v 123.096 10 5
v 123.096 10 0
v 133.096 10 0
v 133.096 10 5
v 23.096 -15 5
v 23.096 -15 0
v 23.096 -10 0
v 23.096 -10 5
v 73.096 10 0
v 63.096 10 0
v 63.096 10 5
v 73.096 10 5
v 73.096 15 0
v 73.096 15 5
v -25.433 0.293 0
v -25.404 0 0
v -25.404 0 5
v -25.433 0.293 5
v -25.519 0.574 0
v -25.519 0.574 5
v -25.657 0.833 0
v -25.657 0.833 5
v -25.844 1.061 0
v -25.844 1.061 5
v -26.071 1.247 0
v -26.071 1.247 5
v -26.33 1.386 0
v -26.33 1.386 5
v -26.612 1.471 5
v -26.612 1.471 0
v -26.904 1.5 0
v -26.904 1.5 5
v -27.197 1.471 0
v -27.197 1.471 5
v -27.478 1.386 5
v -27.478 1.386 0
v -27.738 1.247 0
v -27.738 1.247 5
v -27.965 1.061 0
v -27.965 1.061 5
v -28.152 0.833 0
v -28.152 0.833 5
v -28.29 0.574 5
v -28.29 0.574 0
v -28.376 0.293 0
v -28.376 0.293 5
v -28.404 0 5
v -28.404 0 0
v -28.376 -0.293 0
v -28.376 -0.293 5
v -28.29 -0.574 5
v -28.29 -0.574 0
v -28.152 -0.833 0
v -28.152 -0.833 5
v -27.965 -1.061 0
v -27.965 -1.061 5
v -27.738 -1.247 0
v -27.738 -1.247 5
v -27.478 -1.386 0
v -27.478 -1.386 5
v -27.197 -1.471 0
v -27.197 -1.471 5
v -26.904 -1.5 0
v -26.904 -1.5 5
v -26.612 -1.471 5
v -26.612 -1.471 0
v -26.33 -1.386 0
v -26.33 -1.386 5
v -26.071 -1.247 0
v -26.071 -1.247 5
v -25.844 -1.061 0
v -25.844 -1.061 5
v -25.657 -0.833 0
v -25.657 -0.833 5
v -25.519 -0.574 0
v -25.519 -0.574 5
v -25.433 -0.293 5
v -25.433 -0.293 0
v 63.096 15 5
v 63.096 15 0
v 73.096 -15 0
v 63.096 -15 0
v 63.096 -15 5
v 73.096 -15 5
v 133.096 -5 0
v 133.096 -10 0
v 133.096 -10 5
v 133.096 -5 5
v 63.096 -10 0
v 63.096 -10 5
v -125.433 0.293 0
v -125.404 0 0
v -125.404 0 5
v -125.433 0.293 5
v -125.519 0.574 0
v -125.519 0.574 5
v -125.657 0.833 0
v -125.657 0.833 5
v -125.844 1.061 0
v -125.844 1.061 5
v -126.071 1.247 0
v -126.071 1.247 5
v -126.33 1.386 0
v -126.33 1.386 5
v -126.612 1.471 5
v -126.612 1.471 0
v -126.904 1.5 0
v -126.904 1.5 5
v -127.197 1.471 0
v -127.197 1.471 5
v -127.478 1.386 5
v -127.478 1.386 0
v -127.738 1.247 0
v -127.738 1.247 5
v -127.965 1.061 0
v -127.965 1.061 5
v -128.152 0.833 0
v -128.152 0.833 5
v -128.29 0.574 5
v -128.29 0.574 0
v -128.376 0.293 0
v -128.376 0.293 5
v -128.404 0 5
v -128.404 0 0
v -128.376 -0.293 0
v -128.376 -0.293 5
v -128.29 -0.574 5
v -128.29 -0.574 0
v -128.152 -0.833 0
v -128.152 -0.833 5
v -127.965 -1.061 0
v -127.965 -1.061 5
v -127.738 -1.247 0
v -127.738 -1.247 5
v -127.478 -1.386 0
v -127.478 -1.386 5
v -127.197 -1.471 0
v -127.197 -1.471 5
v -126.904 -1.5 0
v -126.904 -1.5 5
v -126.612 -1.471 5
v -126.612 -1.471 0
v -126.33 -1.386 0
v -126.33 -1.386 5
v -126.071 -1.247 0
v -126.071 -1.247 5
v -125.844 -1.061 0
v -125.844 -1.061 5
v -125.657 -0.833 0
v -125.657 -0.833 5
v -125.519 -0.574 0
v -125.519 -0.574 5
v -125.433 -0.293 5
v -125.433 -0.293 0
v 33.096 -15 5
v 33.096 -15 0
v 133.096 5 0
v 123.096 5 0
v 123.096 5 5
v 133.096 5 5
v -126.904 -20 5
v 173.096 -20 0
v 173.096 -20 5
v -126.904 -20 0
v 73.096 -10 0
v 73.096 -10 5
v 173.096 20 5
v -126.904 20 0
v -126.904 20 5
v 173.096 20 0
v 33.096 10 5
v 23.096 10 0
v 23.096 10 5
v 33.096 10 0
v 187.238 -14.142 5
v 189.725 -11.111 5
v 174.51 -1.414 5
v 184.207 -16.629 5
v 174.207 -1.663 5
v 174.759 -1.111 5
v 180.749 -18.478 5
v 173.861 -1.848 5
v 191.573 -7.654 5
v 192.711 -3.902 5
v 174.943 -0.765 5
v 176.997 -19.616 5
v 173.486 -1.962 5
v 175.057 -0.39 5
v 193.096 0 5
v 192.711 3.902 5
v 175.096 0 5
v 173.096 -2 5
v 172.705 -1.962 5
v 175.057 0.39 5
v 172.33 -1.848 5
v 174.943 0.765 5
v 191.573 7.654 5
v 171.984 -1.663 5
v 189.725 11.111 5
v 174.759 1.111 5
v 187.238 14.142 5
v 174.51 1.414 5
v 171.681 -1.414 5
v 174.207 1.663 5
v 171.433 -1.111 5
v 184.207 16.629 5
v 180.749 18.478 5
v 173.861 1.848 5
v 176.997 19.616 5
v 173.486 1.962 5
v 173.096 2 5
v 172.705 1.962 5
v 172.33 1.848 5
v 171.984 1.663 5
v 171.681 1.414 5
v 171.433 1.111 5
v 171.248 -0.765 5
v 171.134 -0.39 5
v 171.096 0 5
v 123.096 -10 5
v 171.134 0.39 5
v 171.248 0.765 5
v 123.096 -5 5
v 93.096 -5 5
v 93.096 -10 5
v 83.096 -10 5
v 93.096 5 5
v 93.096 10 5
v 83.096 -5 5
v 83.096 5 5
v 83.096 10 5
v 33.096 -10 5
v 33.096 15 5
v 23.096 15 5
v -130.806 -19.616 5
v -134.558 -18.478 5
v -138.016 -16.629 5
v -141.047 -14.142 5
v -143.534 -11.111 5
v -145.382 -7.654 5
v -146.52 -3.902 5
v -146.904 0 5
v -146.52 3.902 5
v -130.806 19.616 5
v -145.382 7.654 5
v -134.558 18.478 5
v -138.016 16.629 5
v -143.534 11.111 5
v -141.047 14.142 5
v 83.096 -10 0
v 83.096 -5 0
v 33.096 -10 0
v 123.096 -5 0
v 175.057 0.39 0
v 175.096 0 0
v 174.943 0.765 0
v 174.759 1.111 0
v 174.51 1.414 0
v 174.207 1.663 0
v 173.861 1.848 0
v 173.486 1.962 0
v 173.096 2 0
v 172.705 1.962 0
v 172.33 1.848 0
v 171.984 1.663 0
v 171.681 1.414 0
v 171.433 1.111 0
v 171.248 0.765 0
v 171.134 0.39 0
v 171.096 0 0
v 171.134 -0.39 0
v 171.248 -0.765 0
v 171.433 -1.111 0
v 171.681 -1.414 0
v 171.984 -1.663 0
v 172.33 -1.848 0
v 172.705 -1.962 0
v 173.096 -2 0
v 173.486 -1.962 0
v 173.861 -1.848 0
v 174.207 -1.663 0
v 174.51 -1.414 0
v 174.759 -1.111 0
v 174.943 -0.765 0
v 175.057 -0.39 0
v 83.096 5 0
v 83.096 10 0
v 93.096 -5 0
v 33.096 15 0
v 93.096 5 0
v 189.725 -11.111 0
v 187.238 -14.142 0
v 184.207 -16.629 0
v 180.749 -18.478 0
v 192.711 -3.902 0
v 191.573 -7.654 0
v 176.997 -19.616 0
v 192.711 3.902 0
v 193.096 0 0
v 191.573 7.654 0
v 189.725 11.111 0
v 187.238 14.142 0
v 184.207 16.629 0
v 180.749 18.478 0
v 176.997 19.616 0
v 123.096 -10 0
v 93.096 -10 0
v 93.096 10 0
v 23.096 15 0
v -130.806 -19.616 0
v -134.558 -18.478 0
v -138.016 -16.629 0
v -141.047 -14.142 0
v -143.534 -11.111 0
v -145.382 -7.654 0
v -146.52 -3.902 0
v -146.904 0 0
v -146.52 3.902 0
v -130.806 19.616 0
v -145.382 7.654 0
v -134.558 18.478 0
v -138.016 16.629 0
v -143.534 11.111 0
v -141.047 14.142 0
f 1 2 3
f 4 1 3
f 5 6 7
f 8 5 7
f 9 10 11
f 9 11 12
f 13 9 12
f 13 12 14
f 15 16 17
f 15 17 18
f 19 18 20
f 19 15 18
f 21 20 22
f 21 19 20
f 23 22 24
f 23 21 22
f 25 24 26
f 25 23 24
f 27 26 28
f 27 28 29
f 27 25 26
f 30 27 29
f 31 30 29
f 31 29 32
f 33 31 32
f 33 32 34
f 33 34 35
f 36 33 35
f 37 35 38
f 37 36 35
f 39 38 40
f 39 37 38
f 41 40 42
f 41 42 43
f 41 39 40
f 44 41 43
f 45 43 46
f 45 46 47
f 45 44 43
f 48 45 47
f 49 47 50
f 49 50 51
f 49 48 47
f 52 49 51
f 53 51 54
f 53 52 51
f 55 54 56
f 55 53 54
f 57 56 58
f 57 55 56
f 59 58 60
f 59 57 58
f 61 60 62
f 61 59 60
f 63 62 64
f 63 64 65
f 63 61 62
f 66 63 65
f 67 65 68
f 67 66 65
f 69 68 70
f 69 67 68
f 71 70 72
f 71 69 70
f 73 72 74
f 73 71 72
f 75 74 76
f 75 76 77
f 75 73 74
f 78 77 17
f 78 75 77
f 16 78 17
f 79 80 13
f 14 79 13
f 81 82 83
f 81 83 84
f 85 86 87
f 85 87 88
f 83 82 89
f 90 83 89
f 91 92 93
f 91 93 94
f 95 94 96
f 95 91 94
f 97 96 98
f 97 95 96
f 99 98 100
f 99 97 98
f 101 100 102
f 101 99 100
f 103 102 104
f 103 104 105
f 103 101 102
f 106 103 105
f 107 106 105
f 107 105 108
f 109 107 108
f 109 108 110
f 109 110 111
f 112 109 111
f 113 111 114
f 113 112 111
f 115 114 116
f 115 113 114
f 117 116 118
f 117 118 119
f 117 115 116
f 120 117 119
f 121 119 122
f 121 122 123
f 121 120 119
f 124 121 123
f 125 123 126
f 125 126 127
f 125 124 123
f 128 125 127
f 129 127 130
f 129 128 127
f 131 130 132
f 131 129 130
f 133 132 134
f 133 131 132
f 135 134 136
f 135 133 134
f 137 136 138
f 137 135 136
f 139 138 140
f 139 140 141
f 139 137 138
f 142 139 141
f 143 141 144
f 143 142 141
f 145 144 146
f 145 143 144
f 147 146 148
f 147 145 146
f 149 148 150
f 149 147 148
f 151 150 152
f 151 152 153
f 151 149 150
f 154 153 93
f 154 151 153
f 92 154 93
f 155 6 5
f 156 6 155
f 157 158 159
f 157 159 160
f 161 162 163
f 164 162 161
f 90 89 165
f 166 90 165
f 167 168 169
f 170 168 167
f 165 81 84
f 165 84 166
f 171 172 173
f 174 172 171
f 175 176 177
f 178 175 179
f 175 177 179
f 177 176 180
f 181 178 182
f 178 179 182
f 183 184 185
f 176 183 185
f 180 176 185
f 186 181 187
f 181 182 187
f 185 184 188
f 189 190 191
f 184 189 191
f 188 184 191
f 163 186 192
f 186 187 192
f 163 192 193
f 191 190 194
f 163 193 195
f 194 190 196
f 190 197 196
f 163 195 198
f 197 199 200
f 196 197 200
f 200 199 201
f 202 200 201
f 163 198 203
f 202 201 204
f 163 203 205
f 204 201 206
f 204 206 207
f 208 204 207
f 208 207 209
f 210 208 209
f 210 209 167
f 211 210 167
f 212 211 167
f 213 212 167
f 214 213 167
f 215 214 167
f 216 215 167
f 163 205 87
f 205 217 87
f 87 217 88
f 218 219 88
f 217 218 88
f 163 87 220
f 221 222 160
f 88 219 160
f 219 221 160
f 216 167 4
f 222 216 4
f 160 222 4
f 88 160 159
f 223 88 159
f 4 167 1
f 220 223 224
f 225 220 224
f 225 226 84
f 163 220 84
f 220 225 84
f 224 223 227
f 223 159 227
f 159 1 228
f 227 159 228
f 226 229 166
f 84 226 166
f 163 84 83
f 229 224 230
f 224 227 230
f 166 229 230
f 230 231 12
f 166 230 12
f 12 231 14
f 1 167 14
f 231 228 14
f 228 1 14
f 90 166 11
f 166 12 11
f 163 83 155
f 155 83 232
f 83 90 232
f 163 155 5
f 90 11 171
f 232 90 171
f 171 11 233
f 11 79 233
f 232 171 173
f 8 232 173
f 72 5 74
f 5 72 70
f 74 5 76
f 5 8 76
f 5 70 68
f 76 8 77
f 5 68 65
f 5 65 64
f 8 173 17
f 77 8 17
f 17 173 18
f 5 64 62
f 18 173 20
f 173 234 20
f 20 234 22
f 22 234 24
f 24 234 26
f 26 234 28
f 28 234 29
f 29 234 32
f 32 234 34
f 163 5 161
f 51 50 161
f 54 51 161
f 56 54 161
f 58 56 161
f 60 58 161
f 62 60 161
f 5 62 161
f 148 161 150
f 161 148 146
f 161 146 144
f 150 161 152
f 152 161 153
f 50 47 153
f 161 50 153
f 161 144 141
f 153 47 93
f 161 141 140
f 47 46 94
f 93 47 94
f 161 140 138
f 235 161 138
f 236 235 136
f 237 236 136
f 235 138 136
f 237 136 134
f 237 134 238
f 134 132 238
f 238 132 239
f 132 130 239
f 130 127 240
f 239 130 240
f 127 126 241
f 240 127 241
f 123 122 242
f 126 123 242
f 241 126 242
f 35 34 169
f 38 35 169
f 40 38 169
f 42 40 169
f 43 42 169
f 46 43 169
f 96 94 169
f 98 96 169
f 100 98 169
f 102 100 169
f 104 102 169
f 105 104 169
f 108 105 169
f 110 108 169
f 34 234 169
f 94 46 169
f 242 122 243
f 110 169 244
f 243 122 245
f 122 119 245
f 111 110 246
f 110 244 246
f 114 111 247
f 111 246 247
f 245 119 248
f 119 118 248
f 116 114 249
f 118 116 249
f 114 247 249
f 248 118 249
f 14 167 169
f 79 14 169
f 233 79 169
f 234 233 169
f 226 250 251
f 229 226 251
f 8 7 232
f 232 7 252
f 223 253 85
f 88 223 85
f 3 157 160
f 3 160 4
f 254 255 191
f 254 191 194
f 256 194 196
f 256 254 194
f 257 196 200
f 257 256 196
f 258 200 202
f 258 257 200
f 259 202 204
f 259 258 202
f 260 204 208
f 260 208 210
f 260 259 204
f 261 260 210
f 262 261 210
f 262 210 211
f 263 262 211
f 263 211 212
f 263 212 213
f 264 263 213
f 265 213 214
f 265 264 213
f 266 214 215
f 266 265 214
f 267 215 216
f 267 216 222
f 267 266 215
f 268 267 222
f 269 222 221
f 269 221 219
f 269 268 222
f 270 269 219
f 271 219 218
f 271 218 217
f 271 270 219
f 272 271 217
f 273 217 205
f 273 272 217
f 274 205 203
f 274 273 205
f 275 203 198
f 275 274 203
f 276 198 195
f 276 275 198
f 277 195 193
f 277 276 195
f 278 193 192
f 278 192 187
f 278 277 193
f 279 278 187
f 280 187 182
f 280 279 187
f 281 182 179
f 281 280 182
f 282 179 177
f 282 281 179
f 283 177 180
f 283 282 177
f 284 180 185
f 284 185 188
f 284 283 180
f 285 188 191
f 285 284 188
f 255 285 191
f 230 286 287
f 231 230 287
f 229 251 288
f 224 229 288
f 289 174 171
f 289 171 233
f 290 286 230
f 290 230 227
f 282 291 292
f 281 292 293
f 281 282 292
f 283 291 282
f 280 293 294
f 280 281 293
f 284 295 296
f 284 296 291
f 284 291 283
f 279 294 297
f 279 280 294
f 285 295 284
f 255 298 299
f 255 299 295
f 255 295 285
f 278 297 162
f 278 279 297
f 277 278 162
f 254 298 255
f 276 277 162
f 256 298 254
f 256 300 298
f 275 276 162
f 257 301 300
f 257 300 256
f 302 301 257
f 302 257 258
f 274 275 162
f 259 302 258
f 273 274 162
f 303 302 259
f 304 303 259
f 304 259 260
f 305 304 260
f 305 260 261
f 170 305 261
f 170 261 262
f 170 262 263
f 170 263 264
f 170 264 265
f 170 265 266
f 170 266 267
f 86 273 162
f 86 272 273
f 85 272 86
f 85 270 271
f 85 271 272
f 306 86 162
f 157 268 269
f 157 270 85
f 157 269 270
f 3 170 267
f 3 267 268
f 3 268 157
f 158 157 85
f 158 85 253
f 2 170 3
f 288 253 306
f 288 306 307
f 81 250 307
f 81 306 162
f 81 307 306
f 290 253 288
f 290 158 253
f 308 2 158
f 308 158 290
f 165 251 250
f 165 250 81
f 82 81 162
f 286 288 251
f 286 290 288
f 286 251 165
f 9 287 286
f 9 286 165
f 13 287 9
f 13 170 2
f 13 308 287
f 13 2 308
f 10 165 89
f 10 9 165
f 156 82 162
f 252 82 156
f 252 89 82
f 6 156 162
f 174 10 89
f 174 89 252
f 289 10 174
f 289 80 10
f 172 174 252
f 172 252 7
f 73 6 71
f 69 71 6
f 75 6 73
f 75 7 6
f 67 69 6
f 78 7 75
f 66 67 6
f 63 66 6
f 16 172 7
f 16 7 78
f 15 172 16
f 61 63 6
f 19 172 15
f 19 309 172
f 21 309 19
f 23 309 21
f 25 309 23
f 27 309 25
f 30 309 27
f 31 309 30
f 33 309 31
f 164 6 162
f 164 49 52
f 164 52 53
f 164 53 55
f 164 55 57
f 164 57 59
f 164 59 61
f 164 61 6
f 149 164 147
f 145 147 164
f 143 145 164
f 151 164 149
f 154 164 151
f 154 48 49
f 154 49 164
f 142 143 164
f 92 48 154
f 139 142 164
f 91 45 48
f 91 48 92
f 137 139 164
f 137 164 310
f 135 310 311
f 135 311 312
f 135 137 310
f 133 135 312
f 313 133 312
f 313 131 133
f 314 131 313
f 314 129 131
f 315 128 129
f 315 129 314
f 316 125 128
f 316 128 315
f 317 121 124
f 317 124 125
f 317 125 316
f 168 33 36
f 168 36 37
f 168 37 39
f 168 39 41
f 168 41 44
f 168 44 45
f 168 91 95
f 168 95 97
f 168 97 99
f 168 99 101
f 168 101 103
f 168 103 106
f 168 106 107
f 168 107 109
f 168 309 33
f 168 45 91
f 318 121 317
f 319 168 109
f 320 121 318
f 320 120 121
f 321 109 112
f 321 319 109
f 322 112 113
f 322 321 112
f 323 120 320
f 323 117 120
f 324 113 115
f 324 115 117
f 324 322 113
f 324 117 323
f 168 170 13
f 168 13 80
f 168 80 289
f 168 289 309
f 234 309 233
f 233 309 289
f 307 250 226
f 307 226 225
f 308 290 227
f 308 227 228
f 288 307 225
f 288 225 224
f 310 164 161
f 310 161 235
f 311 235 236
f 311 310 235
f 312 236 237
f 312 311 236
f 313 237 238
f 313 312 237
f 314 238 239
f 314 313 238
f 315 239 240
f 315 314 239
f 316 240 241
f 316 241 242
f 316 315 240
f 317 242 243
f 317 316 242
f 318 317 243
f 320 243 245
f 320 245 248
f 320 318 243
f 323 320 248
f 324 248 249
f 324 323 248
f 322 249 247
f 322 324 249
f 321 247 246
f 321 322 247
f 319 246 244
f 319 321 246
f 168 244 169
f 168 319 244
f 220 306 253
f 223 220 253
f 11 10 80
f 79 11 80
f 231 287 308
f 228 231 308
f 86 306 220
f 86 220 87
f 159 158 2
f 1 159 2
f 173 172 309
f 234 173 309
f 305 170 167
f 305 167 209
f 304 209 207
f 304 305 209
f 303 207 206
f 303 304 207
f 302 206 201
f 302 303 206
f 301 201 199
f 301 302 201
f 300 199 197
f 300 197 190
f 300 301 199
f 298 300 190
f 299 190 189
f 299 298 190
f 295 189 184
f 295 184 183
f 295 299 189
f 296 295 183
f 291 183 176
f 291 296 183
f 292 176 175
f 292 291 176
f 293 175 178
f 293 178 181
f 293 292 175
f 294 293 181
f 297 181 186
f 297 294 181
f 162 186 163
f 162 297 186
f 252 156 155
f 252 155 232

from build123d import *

# Parameters (mm, degrees)
SKETCH1_R           = 1.5
SKETCH1_R_2         = 2
SKETCH1_W           = 10
SKETCH1_H           = 5
BOSS_EXTRUDE2_DEPTH = 5


with BuildPart() as part:
    # Sketch1 → Boss-Extrude2 (new body)
    with BuildSketch(Plane.XY):
        with BuildLine():
            Line((-126.904376013, 20), (173.095623987, 20))
            ThreePointArc((173.095623987, 20), (193.095623987, 0), (173.095623987, -20))
            Line((173.095623987, -20), (-126.904376013, -20))
            ThreePointArc((-126.904376013, -20), (-146.904376013, 0), (-126.904376013, 20))
        make_face()
        with Locations((-126.904376013, 0)):
            Circle(SKETCH1_R, mode=Mode.SUBTRACT)
        with Locations((173.095623987, 0)):
            Circle(SKETCH1_R_2, mode=Mode.SUBTRACT)
        with Locations((-26.904376013, 0)):
            Circle(SKETCH1_R, mode=Mode.SUBTRACT)
        with Locations((28.095623987, 12.5)):
            Rectangle(SKETCH1_W, SKETCH1_H, mode=Mode.SUBTRACT)
        with Locations((68.095623987, 12.5)):
            Rectangle(SKETCH1_W, SKETCH1_H, mode=Mode.SUBTRACT)
        with Locations((88.095623987, 7.5)):
            Rectangle(SKETCH1_W, SKETCH1_H, mode=Mode.SUBTRACT)
        with Locations((128.095623987, 7.5)):
            Rectangle(SKETCH1_W, SKETCH1_H, mode=Mode.SUBTRACT)
        with Locations((28.095623987, -12.5)):
            Rectangle(SKETCH1_W, SKETCH1_H, mode=Mode.SUBTRACT)
        with Locations((68.095623987, -12.5)):
            Rectangle(SKETCH1_W, SKETCH1_H, mode=Mode.SUBTRACT)
        with Locations((88.095623987, -7.5)):
            Rectangle(SKETCH1_W, SKETCH1_H, mode=Mode.SUBTRACT)
        with Locations((128.095623987, -7.5)):
            Rectangle(SKETCH1_W, SKETCH1_H, mode=Mode.SUBTRACT)
    extrude(amount=BOSS_EXTRUDE2_DEPTH)


solid = part.part
